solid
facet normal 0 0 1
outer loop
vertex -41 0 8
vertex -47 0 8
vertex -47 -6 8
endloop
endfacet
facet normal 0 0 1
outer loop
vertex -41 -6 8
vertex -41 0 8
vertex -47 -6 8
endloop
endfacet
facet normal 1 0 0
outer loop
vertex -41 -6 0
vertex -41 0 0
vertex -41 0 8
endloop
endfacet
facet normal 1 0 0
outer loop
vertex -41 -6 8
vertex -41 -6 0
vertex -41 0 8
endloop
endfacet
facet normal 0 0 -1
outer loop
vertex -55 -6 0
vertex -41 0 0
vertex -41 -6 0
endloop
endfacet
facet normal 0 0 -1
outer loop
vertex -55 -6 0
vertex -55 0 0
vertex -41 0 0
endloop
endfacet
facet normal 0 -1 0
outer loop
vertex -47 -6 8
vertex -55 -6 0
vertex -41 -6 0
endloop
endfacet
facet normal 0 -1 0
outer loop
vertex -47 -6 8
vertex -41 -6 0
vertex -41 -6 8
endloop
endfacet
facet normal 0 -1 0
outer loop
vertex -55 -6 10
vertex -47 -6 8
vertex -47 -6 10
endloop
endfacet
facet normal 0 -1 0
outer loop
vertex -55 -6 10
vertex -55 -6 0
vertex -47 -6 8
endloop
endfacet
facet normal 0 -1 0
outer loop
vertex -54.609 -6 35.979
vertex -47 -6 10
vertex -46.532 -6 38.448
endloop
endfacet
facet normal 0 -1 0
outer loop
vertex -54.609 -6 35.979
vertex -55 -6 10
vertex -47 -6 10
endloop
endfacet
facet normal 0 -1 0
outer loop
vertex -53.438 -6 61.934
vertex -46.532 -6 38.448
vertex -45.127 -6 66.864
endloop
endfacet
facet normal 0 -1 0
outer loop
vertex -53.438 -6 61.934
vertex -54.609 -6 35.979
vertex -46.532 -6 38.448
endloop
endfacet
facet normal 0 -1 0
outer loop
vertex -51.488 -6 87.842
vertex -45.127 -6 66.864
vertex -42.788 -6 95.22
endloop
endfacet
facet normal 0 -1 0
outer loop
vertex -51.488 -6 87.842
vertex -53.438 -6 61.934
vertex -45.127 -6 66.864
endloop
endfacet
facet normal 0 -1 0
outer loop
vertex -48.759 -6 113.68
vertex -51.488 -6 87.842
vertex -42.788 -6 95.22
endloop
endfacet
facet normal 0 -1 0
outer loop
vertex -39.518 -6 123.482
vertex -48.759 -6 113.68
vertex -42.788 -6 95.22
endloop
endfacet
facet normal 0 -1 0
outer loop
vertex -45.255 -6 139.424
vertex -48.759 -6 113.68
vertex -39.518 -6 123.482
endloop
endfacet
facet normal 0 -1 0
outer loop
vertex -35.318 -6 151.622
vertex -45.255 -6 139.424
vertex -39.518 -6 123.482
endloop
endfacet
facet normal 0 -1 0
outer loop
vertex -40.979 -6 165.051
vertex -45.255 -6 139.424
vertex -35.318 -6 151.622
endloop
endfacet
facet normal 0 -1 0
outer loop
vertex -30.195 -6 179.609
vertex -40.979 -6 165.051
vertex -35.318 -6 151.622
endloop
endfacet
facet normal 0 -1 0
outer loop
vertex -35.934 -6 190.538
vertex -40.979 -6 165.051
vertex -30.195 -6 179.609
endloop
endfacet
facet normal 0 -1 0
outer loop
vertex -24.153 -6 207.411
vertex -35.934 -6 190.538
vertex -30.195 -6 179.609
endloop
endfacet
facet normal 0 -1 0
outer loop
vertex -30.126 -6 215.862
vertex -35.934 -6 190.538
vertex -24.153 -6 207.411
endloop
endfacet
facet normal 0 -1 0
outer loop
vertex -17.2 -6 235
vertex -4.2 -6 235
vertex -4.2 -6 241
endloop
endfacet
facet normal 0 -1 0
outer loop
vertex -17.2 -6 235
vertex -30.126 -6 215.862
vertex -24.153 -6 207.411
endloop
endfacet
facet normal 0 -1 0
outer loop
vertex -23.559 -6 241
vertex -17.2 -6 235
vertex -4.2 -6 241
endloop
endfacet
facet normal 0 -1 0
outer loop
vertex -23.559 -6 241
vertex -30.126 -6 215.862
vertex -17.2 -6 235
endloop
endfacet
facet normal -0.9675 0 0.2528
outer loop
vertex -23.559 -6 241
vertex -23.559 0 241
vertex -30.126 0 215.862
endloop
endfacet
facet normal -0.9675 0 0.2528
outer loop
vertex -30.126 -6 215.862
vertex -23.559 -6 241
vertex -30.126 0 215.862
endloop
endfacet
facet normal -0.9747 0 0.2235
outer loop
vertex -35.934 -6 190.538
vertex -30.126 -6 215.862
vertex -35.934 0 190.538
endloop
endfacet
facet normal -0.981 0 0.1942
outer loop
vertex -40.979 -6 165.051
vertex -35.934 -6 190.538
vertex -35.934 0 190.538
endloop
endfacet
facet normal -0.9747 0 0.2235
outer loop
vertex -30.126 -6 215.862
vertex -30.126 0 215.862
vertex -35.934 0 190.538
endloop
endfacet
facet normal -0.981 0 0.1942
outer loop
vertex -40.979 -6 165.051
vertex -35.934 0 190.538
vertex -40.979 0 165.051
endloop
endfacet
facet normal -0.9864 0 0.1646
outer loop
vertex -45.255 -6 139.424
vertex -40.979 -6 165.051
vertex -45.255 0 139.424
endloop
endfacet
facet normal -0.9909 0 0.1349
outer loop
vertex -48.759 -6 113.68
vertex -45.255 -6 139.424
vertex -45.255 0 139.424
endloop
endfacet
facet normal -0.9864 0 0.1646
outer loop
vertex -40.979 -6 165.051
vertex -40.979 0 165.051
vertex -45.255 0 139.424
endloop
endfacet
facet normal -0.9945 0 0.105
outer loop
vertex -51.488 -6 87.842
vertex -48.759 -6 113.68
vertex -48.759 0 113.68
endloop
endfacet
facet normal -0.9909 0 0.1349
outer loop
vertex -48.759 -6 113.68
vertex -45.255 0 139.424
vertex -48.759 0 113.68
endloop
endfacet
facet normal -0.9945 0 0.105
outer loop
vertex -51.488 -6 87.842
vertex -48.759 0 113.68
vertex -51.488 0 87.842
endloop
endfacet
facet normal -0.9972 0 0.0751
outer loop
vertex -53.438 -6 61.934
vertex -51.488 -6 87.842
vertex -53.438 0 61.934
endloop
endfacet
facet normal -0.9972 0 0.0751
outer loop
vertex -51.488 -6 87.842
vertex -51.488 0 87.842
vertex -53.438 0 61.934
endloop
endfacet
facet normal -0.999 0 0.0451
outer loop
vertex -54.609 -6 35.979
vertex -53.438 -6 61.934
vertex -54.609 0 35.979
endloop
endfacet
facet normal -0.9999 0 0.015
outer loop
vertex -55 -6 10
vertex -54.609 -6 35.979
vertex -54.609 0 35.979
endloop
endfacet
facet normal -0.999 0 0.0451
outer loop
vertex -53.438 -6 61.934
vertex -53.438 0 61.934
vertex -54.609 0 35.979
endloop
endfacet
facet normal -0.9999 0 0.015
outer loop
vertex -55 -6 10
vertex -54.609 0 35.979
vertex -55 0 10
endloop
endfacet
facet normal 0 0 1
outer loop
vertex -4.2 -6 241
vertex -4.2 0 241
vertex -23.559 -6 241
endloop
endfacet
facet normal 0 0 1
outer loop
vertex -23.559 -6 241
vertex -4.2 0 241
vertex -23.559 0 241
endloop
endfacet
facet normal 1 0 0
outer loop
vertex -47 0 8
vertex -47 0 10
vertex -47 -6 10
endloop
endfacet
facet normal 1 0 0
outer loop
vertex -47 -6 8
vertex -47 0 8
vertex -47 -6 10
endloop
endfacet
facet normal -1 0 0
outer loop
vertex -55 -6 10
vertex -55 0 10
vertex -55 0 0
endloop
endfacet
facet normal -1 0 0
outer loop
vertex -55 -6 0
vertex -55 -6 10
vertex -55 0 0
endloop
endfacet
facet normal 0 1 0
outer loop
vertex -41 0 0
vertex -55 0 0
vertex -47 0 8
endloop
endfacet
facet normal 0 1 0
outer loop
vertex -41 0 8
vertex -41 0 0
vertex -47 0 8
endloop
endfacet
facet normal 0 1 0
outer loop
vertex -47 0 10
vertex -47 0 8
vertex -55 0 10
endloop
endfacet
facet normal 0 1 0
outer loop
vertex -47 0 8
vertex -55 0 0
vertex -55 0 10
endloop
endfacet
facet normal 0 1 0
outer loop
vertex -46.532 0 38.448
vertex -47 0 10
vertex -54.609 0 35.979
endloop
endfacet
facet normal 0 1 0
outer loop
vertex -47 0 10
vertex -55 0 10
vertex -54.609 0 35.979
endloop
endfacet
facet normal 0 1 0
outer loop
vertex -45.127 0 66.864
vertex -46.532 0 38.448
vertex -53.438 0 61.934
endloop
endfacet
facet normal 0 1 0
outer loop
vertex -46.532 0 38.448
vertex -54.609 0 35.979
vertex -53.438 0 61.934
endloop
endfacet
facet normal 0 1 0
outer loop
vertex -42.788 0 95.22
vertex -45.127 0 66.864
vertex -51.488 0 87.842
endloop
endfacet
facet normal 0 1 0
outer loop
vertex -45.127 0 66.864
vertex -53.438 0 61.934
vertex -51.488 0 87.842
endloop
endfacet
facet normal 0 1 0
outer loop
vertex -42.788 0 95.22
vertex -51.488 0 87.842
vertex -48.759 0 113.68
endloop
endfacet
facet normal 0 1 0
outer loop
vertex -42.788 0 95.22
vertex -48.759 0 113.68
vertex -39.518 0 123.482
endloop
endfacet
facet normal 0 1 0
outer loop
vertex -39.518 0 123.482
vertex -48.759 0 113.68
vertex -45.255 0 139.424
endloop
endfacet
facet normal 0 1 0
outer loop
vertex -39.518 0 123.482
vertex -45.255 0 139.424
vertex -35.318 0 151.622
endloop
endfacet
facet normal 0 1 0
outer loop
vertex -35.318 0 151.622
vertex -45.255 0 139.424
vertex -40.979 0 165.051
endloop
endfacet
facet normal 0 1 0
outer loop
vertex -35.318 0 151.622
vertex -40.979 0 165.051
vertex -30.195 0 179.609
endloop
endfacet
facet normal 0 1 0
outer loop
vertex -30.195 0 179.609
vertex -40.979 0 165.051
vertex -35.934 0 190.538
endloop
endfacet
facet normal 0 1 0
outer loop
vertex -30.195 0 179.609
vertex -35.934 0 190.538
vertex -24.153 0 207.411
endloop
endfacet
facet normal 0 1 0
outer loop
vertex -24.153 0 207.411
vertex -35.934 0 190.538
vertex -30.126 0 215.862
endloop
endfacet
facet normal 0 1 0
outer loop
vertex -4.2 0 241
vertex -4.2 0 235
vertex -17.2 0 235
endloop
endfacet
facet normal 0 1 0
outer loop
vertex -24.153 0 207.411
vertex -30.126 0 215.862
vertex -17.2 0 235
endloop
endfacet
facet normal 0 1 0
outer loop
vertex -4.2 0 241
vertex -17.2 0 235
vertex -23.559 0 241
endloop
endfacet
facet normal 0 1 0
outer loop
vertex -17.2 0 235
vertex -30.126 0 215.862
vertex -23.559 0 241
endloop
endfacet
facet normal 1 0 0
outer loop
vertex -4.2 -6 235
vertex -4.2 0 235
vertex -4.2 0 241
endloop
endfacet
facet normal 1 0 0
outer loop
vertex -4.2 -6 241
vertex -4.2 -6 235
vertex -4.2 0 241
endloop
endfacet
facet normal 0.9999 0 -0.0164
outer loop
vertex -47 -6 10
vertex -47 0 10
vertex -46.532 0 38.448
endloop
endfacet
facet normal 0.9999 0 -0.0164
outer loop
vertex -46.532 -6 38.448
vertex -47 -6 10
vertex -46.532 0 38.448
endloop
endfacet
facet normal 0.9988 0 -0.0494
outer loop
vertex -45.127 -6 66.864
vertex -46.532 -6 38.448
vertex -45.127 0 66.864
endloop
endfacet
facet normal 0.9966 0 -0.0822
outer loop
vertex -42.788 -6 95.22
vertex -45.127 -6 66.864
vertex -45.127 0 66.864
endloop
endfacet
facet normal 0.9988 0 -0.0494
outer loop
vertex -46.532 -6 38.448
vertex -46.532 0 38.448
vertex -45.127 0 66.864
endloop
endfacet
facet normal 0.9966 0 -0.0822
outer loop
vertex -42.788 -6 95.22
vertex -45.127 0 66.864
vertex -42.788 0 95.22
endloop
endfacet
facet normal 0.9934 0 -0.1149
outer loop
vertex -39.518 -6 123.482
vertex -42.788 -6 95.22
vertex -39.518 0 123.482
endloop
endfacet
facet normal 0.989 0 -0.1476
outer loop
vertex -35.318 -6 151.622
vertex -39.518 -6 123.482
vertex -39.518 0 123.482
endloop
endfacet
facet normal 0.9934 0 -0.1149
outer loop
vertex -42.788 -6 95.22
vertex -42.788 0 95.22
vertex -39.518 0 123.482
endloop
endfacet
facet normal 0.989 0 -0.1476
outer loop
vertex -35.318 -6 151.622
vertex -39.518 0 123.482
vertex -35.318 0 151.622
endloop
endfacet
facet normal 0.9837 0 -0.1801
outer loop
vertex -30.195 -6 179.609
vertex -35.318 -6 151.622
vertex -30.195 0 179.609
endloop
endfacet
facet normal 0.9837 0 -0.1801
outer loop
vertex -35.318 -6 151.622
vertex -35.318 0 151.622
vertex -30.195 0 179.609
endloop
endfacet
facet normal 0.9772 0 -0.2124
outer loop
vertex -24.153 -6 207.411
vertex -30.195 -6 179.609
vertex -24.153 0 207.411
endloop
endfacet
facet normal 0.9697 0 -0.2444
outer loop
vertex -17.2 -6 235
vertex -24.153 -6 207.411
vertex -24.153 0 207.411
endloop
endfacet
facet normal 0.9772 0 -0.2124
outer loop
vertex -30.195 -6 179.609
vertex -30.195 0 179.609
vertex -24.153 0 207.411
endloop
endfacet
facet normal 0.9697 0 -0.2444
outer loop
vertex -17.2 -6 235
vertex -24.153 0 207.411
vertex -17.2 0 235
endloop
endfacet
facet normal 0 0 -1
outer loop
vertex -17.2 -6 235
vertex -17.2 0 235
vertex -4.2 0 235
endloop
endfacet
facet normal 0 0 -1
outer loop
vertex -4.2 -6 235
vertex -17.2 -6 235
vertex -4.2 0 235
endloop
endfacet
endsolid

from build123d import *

# Parameters (mm, degrees)
F1_DEPTH = 6
F2_DEPTH = 6
F3_DEPTH = 2


with BuildPart() as f1:
    # F0 (on Front) → F1 (new body)
    with BuildSketch(Plane.XZ):
        with BuildLine():
            Line((-17.2, 235), (-4.2, 235))
            Line((-4.2, 235), (-4.2, 241))
            Line((-4.2, 241), (-23.5591068412, 241))
            ThreePointArc((-23.5591068412, 241), (-47.1037067536, 126.5649280043), (-55, 10))
            Line((-55, 10), (-55, 0))
            Line((-55, 0), (-47, 0))
            Line((-47, 0), (-47, 10))
            ThreePointArc((-47, 10), (-39.5176123458, 123.4824215462), (-17.2, 235))
        make_face()
    extrude(amount=F1_DEPTH)

    # F2 (add): a face of the model
    f2_faces = [f1.faces().sort_by_distance(p)[0] for p in [
        (-47, -3, 5),
    ]]
    extrude(f2_faces, amount=F2_DEPTH)

    # F3 (cut): a face of the model
    f3_faces = [f1.faces().sort_by_distance(p)[0] for p in [
        (-44, -3, 10),
    ]]
    extrude(f3_faces, amount=-F3_DEPTH, mode=Mode.SUBTRACT)


solid = f1.part
